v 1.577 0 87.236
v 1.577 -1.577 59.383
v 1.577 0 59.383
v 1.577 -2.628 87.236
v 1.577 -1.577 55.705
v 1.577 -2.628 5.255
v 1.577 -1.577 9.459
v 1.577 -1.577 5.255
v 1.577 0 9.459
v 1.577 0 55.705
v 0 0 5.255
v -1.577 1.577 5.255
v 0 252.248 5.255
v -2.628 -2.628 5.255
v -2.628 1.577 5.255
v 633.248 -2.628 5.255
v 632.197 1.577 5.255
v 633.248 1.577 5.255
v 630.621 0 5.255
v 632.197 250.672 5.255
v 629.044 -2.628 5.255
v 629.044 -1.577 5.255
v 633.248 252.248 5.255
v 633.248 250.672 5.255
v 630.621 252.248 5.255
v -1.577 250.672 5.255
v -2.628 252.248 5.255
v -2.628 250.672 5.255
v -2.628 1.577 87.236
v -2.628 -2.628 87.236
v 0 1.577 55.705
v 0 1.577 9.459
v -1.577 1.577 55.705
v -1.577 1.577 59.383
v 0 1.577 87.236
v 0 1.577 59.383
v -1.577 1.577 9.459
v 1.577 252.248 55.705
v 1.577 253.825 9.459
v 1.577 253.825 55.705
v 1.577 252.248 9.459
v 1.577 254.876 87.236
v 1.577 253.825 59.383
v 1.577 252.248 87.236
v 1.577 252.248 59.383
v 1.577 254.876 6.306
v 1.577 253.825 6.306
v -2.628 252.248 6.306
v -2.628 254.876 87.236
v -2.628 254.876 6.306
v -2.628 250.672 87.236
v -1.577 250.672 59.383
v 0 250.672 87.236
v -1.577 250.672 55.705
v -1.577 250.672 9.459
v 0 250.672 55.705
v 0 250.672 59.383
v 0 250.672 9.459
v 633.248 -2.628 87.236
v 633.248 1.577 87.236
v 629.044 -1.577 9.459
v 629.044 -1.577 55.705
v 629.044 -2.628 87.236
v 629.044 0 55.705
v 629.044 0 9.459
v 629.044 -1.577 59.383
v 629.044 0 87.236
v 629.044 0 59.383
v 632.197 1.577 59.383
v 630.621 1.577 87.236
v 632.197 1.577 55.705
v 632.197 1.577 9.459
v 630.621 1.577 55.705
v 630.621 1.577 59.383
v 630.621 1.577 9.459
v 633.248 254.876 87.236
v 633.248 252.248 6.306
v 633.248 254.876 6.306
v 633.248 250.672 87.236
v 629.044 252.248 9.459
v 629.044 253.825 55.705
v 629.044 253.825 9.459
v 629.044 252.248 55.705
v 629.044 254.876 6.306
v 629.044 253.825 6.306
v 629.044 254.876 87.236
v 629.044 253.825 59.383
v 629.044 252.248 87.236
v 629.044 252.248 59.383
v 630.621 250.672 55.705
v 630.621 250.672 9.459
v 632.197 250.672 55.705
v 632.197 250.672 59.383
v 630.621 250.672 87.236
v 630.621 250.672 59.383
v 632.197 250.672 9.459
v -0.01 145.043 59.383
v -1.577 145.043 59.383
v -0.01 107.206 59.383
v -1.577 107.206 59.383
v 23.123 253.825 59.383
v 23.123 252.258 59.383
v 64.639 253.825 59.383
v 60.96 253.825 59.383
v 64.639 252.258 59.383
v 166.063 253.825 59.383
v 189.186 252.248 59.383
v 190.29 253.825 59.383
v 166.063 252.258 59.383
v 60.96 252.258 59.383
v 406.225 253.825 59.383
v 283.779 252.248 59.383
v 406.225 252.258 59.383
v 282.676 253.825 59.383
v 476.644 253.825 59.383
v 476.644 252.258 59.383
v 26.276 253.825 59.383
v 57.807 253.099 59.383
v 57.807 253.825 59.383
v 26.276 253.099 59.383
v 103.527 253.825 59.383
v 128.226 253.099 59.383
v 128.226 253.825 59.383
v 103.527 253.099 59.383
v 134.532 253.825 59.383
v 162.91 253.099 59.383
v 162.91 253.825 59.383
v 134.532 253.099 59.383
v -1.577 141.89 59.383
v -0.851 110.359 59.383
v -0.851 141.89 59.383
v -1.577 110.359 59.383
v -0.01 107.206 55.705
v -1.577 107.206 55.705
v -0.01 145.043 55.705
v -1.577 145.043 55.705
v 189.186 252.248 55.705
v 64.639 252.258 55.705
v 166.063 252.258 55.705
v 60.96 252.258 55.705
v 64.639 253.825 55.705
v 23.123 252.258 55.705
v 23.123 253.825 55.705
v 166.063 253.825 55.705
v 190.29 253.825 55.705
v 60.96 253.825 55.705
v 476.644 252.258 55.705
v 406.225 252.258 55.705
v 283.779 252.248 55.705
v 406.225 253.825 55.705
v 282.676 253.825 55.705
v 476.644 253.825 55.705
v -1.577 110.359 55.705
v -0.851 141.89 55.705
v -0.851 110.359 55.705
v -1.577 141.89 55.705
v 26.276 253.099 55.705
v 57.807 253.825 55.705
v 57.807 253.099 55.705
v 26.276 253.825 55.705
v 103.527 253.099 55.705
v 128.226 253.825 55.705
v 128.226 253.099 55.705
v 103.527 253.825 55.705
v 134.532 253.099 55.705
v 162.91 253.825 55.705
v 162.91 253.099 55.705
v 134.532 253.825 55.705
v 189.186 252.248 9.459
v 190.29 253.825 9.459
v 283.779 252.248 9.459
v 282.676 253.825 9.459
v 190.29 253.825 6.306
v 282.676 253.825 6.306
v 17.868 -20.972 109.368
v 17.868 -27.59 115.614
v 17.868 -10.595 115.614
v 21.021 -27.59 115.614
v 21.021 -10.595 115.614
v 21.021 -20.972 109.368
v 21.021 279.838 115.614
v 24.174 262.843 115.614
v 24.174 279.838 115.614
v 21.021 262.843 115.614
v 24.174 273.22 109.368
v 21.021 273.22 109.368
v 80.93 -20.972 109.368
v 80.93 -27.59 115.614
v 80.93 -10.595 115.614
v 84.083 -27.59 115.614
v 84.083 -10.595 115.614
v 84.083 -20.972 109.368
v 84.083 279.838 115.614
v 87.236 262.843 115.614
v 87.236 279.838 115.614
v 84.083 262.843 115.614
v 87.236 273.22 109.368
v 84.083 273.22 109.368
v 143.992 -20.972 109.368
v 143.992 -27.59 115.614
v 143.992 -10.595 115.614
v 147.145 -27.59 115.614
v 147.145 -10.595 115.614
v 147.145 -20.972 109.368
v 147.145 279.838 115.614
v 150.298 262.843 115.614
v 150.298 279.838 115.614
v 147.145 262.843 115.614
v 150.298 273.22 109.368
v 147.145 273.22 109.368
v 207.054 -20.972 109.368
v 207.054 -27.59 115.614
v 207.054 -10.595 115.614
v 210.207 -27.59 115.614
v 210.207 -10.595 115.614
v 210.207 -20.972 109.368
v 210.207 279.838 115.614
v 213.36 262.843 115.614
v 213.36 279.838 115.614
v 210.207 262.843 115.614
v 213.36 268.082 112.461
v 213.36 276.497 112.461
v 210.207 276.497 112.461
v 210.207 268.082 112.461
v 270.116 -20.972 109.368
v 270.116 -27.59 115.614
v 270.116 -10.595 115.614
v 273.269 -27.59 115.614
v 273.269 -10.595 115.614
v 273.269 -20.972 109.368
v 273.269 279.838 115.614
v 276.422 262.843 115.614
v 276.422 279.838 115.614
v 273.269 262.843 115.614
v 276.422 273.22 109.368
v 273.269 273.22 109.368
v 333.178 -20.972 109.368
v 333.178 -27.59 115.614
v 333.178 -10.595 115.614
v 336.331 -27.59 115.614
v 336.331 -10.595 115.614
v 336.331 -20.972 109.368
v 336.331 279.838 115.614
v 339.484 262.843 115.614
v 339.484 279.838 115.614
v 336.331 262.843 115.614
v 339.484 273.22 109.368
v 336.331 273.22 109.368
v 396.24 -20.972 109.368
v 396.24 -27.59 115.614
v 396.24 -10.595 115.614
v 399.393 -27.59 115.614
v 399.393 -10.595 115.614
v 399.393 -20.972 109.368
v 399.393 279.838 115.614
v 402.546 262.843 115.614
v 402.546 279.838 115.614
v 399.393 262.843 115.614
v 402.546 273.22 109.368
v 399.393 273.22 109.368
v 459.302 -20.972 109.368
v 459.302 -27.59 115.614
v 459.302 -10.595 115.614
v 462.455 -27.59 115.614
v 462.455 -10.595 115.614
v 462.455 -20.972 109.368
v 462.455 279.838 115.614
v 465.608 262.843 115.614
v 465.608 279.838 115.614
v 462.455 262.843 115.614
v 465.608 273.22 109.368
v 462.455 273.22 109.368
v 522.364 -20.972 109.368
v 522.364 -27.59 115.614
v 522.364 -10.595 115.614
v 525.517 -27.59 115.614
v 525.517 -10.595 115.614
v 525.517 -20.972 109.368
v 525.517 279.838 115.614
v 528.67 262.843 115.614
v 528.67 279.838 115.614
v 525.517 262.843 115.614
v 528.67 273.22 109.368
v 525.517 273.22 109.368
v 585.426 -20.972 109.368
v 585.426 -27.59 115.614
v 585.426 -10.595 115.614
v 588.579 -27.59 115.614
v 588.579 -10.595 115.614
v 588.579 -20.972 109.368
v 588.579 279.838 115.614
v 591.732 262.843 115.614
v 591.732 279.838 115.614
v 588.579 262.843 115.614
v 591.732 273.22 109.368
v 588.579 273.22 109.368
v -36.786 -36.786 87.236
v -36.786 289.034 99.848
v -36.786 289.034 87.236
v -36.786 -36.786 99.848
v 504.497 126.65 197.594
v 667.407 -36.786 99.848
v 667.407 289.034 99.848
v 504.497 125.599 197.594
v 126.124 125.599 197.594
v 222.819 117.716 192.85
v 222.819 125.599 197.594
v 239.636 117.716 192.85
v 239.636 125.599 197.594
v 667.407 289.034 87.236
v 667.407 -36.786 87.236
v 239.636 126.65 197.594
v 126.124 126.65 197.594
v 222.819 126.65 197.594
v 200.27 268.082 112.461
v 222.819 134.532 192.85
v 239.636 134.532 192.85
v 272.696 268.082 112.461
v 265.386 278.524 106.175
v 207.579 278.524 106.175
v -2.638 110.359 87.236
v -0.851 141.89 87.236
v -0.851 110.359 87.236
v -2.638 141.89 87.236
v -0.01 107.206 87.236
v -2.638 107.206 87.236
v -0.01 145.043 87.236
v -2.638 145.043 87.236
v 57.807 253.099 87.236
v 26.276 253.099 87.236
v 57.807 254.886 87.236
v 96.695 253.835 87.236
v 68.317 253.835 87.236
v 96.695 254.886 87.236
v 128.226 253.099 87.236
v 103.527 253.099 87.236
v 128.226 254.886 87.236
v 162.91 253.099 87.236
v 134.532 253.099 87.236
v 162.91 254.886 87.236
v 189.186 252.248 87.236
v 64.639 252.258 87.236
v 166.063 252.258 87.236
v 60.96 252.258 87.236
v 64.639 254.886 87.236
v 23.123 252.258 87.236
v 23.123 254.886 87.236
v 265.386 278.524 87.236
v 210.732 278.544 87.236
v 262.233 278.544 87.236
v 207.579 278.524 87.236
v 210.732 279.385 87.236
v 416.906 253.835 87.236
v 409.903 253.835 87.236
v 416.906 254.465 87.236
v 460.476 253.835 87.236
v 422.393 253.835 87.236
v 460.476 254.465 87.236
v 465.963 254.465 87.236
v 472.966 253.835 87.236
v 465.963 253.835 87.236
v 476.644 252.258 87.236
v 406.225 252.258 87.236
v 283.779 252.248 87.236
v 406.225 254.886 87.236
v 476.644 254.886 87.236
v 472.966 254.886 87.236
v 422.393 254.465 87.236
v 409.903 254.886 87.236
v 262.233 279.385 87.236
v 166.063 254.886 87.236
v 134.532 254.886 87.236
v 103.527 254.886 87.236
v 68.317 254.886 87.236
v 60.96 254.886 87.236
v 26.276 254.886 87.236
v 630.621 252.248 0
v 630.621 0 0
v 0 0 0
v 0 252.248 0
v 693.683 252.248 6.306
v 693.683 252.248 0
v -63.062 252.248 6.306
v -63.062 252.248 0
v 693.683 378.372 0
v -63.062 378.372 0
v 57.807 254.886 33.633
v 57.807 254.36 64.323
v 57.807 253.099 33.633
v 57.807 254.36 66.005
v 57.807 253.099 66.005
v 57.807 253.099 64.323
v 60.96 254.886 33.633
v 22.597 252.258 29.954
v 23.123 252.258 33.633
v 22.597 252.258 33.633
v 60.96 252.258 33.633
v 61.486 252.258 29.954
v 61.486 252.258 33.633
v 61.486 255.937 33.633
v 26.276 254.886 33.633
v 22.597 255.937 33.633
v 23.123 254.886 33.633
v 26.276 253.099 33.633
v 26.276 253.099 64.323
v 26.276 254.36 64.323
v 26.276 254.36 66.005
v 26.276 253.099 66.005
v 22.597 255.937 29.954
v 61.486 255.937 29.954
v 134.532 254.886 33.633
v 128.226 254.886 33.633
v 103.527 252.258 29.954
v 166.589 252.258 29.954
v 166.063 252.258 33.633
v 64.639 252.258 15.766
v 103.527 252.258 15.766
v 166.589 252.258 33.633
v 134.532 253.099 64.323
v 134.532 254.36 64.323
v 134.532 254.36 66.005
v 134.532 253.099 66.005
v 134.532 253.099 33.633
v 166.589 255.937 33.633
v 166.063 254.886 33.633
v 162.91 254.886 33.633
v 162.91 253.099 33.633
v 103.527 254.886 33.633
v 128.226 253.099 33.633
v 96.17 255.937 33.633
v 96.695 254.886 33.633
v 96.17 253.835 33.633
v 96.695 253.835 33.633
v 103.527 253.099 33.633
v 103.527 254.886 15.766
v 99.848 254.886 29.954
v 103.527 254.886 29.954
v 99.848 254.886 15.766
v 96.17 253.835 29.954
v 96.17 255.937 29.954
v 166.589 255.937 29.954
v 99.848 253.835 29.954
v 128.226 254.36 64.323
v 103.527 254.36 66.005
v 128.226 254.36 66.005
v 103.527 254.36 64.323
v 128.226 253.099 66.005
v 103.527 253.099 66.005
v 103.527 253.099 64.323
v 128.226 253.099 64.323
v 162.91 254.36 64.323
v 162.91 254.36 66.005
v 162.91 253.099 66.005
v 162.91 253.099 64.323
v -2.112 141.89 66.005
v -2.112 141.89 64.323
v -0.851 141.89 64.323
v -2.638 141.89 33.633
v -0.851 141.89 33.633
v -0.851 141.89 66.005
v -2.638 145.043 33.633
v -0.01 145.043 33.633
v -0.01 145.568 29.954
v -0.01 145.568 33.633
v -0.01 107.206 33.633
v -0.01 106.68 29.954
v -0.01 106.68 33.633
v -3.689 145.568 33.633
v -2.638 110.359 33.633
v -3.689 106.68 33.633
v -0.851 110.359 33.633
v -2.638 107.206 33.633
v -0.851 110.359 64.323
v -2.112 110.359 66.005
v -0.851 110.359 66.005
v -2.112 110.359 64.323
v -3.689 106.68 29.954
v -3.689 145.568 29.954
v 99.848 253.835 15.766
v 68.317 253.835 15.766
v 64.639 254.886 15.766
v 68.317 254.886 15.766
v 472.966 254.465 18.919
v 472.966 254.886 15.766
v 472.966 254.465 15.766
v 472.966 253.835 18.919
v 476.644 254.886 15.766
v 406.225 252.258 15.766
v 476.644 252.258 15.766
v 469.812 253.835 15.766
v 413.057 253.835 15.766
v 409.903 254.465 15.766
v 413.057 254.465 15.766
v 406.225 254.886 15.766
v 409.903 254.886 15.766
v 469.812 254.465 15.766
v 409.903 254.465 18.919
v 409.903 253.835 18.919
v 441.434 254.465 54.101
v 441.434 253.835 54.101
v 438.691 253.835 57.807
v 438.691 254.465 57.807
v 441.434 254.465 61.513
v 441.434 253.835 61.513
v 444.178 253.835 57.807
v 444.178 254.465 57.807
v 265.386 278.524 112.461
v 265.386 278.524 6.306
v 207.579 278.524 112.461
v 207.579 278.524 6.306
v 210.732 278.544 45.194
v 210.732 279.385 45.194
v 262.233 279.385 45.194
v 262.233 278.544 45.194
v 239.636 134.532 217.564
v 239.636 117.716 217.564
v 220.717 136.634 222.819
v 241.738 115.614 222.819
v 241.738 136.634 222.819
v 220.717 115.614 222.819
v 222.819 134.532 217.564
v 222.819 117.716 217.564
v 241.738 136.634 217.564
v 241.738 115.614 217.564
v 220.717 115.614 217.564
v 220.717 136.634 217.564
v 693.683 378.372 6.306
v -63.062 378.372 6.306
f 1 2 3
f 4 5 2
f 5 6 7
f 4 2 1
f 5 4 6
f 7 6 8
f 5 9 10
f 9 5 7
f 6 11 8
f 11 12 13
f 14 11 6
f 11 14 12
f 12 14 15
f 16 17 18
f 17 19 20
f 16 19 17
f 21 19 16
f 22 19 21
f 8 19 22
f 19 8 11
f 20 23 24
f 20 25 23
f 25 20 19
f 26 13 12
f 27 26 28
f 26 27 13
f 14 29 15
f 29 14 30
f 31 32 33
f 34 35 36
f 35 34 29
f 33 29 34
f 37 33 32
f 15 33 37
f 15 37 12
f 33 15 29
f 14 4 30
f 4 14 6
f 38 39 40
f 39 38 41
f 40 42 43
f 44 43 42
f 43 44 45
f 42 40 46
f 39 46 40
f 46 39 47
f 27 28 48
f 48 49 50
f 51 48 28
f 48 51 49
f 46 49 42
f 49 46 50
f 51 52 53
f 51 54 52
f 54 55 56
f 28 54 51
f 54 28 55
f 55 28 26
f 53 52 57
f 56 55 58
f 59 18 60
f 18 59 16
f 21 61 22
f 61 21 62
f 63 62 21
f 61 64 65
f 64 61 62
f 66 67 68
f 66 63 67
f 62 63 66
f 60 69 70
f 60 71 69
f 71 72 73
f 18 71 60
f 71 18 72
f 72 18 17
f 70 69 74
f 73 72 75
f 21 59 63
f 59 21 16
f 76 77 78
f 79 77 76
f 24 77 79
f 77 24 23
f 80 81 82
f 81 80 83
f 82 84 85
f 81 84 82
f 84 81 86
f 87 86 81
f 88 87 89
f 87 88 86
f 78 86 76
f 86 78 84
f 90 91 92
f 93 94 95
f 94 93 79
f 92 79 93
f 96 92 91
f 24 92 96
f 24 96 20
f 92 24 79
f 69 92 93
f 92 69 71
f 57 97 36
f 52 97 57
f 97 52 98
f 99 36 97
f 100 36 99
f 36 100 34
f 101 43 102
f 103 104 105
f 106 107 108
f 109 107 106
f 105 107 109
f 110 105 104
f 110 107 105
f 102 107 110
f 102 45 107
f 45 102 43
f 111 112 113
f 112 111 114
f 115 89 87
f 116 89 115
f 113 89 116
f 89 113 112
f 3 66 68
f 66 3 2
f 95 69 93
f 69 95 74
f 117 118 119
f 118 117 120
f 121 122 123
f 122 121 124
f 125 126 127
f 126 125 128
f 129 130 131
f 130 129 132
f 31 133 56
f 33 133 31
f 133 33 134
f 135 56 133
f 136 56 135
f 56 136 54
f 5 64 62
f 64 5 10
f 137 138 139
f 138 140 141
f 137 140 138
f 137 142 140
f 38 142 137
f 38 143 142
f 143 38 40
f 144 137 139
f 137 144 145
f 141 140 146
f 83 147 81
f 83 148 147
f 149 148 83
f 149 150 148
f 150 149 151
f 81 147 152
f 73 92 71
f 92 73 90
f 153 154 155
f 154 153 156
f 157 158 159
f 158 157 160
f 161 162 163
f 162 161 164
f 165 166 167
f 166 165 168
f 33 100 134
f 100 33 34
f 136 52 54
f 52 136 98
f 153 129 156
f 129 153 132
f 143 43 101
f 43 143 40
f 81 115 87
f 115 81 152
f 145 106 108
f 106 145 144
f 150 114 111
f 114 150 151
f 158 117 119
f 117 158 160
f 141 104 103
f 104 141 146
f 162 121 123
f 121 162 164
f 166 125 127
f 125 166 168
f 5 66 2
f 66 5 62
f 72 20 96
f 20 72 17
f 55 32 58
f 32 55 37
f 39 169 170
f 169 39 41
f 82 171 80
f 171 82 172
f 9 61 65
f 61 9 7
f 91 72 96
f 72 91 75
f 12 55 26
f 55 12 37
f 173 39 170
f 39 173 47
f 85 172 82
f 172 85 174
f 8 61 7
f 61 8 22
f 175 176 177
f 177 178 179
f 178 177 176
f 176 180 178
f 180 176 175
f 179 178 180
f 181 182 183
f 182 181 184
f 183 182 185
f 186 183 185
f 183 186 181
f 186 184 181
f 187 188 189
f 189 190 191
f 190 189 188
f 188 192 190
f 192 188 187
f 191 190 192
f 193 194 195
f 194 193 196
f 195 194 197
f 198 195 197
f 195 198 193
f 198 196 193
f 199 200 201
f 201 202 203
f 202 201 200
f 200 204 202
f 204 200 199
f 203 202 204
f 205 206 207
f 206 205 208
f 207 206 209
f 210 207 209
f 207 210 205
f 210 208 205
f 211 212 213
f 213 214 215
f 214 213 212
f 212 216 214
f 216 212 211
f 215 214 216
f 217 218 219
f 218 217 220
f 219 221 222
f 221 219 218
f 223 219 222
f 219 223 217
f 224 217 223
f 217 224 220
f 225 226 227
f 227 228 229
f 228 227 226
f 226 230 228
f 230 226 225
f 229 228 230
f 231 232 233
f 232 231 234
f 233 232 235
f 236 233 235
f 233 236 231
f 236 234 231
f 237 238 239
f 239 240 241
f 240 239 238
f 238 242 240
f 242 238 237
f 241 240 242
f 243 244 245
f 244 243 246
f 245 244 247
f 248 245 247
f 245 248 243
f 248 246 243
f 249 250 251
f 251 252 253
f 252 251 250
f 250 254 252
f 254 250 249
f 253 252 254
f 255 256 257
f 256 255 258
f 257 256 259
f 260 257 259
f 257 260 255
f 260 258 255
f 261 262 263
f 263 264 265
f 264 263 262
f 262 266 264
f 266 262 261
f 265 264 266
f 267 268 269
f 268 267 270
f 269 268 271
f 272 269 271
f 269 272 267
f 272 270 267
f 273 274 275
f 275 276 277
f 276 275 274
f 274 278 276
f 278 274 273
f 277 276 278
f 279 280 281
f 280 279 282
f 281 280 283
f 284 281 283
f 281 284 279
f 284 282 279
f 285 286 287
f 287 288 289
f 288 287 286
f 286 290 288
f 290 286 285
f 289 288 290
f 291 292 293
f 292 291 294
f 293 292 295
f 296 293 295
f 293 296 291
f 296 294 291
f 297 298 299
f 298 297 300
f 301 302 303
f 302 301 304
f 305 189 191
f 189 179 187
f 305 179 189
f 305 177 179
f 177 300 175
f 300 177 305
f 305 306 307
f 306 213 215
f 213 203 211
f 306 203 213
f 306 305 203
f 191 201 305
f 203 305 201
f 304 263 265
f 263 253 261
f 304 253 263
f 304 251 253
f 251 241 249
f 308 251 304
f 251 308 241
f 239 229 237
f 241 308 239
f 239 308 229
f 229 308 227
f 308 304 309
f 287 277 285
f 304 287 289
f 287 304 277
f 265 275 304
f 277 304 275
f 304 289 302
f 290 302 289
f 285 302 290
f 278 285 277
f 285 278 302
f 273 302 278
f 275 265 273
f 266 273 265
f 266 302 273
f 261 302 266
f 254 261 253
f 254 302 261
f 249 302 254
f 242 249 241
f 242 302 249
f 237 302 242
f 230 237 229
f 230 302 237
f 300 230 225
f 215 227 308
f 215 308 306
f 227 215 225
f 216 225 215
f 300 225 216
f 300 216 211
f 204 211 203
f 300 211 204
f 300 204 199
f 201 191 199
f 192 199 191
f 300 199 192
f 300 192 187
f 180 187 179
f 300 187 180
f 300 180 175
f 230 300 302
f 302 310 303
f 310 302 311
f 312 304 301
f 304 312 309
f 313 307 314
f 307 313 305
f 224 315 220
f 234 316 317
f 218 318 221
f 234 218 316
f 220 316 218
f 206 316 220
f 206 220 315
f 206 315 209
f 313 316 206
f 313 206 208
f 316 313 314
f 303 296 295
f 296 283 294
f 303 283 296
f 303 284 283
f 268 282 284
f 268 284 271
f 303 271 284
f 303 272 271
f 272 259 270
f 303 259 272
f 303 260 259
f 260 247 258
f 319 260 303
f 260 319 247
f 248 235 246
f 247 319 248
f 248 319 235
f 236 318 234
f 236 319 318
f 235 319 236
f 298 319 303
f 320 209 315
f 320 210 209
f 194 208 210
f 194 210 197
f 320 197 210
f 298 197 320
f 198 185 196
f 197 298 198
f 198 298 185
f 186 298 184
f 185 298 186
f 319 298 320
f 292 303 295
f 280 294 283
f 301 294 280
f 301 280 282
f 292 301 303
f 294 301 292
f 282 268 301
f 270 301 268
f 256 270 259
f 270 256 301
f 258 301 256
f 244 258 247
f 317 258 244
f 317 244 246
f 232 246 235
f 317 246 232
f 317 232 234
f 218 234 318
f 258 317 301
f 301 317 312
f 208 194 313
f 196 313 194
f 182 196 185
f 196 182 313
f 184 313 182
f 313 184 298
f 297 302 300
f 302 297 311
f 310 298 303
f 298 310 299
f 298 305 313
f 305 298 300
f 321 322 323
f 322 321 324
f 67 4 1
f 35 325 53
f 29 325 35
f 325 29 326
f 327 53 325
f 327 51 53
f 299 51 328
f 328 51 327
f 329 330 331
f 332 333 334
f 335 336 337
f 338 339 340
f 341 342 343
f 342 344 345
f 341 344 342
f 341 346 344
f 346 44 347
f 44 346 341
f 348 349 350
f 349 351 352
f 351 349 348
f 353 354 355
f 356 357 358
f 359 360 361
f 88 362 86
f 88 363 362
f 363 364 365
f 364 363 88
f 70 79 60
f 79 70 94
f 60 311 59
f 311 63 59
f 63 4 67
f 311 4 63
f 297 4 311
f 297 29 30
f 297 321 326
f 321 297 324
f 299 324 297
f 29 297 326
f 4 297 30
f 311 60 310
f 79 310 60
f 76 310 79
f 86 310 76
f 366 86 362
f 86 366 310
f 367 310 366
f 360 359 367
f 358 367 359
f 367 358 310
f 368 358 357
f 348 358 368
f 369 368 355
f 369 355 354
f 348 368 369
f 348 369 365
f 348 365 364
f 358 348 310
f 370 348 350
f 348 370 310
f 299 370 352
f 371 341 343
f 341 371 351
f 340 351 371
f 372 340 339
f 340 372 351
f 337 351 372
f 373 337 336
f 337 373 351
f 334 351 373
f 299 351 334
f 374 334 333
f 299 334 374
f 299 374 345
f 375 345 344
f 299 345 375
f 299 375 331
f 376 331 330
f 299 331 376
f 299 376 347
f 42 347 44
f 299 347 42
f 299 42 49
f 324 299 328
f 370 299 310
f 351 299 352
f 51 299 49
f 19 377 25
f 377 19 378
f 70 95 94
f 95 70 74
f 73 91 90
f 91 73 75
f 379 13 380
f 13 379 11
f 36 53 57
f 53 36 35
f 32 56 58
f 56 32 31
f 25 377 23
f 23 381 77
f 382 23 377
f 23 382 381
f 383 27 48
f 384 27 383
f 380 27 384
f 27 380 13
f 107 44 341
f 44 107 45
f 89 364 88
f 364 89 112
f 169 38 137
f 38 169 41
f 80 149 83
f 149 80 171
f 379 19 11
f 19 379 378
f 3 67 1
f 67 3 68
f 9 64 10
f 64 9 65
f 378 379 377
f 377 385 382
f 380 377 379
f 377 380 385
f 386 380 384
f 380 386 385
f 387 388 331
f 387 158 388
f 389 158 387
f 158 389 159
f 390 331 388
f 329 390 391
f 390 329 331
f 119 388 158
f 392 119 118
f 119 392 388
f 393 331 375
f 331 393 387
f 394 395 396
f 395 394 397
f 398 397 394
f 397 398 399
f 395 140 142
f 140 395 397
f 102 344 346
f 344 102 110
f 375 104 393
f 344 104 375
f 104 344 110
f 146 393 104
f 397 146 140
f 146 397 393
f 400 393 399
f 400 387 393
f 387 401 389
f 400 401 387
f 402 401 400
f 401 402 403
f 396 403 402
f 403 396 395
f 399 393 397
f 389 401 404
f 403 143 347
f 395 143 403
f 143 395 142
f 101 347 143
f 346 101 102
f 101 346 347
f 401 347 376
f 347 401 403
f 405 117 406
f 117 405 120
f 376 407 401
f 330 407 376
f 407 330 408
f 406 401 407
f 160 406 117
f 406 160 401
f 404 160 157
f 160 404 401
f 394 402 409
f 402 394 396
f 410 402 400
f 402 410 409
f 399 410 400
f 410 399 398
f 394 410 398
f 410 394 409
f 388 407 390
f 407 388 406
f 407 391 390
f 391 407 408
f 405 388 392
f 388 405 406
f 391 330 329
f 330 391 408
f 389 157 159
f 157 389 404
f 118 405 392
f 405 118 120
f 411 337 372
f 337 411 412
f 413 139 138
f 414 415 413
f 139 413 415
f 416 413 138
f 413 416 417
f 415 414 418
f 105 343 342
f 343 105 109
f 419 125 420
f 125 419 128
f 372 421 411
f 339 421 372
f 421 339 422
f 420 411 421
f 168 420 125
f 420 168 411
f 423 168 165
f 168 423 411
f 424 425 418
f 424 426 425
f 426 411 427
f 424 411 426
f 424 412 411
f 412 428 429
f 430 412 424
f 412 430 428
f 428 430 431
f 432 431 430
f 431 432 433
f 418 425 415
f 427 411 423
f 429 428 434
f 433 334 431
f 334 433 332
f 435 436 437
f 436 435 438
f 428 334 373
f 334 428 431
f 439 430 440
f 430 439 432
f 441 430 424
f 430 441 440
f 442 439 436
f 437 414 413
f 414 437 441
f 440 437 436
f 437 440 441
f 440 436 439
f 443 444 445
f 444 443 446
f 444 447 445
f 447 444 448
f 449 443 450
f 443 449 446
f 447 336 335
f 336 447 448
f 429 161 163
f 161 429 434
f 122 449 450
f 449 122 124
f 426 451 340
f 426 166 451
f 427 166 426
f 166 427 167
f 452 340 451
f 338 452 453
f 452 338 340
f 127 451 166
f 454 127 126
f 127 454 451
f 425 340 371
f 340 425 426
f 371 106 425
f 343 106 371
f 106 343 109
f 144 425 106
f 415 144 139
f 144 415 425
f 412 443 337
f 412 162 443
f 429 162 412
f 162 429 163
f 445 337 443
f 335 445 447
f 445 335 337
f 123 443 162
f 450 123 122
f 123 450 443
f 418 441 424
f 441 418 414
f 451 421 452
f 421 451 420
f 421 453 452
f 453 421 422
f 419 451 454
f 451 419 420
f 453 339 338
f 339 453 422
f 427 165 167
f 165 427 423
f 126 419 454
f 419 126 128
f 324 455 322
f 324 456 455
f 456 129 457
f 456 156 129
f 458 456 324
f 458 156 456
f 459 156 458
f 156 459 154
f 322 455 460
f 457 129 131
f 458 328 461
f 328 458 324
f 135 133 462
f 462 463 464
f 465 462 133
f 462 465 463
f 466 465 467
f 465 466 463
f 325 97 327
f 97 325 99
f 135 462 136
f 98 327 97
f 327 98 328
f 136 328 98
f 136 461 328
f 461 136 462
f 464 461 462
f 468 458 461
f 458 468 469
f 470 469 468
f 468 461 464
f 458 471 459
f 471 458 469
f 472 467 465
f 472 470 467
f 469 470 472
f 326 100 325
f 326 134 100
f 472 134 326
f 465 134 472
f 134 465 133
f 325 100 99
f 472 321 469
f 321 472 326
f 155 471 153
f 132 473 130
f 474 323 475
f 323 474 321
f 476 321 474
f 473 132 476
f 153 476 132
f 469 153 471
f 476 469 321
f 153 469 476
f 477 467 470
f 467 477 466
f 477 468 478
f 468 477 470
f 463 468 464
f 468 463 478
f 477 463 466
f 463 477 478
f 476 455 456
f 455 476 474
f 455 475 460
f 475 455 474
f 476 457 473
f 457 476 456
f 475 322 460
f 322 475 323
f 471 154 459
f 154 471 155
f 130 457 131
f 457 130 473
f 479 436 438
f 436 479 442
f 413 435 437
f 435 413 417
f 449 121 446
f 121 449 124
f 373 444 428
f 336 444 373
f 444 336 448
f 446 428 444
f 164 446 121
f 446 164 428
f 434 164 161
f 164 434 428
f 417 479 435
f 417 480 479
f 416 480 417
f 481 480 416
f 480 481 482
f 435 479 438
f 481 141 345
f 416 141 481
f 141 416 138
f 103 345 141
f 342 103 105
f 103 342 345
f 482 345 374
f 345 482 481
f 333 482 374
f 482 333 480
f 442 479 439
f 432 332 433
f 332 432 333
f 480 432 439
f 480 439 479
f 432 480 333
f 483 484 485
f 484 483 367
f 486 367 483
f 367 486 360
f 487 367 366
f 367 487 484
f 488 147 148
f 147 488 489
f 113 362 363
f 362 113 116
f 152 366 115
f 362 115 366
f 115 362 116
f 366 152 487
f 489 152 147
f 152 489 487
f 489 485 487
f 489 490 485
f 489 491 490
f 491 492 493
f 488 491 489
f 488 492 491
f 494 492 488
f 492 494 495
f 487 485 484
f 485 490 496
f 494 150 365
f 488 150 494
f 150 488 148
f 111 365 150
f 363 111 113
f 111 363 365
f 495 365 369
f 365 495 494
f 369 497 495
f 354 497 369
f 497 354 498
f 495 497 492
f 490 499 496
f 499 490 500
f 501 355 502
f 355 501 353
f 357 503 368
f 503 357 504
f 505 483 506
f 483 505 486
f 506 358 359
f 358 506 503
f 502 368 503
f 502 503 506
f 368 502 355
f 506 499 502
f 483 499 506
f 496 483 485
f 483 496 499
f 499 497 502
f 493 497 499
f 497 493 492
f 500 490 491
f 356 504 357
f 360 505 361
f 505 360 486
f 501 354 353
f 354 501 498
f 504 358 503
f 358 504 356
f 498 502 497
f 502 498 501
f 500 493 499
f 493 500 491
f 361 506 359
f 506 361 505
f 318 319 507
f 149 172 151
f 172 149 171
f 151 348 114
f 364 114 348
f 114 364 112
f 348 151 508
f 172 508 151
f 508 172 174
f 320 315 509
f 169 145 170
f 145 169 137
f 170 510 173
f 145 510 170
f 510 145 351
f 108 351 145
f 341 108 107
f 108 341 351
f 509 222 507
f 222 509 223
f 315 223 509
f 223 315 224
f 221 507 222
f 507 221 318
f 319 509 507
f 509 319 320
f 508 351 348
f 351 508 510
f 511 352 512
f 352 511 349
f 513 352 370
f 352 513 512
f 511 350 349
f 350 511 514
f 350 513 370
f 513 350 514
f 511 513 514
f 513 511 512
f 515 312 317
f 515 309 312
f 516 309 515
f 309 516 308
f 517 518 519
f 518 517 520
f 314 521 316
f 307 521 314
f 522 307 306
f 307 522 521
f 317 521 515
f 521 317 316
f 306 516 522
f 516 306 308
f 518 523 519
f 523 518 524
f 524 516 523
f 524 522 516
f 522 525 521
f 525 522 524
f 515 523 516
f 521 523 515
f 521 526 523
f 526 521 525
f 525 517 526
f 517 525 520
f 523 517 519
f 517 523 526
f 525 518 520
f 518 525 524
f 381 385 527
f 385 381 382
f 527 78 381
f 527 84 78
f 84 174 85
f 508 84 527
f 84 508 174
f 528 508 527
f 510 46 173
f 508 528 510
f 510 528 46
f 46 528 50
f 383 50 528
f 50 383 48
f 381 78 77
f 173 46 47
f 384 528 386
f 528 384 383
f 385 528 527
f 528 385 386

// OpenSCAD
// =====================================================================
//  MILWAUKEE ROAD - STANDARD 24 X 60 FT DEPOT (C.M.&ST.P., NOV 1899)
//  Album of Depot Plans (1919), sheet 08. Private reference (in copyright):
//  Research Library / RSW / Stations / Standard depots / Album of Depot Plans 1919.
//  Rib Side Works, 24 Nov 2026. FIRST SHAPE MODEL for review - not cut into print sections.
//  KNOWN (from the sheet): 24 x 60 ft; waiting room 17, office 11 with bay, freight room 30; hipped shingle roof with cresting, lap siding over drop siding; built at Elm Springs, Middleton, So. Amana, Dexter and Arlington.
//  ESTIMATE: wall and ridge heights (sheets are small copies), window spacing, colours.
//  Shared depot builder ../../../_common/rsw_depot.scad (x along the track, y = 0 town side,
//  track side +y, feet).  SCALE: 29 = G, 48 = O, 87 = HO.
// =====================================================================
SCALE = 29;
include <../../../_common/rsw_depot.scad>

depot(blocks = [[0, 60, 0, 24, 11, 0.6, 0, 3.5, 0]],
      pavs   = [],
      wins   = [[4, 1, 3, 6, 3.2], [11, 1, 3, 6, 3.2], [14, 1, 3, 6, 3.2], [12, 2, 3, 6, 3.2]],
      doors  = [[8, 1, 3, 7.5, 0], [42, 1, 6, 8, 2]],
      bays   = [[22.5, 1, 9, 2.5]],
      chims  = [[22, 12, 21.2]],
      plat   = [-6, 72, 12, 0.6]);
